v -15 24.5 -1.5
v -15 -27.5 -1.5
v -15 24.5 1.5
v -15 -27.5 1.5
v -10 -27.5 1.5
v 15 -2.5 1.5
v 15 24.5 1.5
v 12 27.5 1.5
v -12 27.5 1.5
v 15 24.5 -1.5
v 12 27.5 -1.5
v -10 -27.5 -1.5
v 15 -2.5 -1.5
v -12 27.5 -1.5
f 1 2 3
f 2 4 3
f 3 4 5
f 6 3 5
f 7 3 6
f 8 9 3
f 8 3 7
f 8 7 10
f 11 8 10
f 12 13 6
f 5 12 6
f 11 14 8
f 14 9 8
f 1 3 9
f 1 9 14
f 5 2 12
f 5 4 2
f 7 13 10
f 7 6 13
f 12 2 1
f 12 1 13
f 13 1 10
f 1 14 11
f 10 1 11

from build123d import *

# Parameters (mm, degrees)
SKETCH1_W           = 30
SKETCH1_H           = 55
BOSS_EXTRUDE1_DEPTH = 1.5
CHAMFER1_SIZE       = 3
CHAMFER2_SIZE       = 25


with BuildPart() as part:
    # Sketch1 → Boss-Extrude1 (new, symmetric)
    with BuildSketch(Plane.XY):
        Rectangle(SKETCH1_W, SKETCH1_H)
    extrude(amount=BOSS_EXTRUDE1_DEPTH, both=True)

    # Chamfer1
    chamfer1_edges = [part.edges().sort_by_distance(p)[0] for p in [
        (-15, 27.5, 0),
        (15, 27.5, 0),
    ]]
    chamfer(chamfer1_edges, length=CHAMFER1_SIZE)

    # Chamfer2
    chamfer2_edges = [part.edges().sort_by_distance(p)[0] for p in [
        (15, -27.5, 0),
    ]]
    chamfer(chamfer2_edges, length=CHAMFER2_SIZE)


solid = part.part
